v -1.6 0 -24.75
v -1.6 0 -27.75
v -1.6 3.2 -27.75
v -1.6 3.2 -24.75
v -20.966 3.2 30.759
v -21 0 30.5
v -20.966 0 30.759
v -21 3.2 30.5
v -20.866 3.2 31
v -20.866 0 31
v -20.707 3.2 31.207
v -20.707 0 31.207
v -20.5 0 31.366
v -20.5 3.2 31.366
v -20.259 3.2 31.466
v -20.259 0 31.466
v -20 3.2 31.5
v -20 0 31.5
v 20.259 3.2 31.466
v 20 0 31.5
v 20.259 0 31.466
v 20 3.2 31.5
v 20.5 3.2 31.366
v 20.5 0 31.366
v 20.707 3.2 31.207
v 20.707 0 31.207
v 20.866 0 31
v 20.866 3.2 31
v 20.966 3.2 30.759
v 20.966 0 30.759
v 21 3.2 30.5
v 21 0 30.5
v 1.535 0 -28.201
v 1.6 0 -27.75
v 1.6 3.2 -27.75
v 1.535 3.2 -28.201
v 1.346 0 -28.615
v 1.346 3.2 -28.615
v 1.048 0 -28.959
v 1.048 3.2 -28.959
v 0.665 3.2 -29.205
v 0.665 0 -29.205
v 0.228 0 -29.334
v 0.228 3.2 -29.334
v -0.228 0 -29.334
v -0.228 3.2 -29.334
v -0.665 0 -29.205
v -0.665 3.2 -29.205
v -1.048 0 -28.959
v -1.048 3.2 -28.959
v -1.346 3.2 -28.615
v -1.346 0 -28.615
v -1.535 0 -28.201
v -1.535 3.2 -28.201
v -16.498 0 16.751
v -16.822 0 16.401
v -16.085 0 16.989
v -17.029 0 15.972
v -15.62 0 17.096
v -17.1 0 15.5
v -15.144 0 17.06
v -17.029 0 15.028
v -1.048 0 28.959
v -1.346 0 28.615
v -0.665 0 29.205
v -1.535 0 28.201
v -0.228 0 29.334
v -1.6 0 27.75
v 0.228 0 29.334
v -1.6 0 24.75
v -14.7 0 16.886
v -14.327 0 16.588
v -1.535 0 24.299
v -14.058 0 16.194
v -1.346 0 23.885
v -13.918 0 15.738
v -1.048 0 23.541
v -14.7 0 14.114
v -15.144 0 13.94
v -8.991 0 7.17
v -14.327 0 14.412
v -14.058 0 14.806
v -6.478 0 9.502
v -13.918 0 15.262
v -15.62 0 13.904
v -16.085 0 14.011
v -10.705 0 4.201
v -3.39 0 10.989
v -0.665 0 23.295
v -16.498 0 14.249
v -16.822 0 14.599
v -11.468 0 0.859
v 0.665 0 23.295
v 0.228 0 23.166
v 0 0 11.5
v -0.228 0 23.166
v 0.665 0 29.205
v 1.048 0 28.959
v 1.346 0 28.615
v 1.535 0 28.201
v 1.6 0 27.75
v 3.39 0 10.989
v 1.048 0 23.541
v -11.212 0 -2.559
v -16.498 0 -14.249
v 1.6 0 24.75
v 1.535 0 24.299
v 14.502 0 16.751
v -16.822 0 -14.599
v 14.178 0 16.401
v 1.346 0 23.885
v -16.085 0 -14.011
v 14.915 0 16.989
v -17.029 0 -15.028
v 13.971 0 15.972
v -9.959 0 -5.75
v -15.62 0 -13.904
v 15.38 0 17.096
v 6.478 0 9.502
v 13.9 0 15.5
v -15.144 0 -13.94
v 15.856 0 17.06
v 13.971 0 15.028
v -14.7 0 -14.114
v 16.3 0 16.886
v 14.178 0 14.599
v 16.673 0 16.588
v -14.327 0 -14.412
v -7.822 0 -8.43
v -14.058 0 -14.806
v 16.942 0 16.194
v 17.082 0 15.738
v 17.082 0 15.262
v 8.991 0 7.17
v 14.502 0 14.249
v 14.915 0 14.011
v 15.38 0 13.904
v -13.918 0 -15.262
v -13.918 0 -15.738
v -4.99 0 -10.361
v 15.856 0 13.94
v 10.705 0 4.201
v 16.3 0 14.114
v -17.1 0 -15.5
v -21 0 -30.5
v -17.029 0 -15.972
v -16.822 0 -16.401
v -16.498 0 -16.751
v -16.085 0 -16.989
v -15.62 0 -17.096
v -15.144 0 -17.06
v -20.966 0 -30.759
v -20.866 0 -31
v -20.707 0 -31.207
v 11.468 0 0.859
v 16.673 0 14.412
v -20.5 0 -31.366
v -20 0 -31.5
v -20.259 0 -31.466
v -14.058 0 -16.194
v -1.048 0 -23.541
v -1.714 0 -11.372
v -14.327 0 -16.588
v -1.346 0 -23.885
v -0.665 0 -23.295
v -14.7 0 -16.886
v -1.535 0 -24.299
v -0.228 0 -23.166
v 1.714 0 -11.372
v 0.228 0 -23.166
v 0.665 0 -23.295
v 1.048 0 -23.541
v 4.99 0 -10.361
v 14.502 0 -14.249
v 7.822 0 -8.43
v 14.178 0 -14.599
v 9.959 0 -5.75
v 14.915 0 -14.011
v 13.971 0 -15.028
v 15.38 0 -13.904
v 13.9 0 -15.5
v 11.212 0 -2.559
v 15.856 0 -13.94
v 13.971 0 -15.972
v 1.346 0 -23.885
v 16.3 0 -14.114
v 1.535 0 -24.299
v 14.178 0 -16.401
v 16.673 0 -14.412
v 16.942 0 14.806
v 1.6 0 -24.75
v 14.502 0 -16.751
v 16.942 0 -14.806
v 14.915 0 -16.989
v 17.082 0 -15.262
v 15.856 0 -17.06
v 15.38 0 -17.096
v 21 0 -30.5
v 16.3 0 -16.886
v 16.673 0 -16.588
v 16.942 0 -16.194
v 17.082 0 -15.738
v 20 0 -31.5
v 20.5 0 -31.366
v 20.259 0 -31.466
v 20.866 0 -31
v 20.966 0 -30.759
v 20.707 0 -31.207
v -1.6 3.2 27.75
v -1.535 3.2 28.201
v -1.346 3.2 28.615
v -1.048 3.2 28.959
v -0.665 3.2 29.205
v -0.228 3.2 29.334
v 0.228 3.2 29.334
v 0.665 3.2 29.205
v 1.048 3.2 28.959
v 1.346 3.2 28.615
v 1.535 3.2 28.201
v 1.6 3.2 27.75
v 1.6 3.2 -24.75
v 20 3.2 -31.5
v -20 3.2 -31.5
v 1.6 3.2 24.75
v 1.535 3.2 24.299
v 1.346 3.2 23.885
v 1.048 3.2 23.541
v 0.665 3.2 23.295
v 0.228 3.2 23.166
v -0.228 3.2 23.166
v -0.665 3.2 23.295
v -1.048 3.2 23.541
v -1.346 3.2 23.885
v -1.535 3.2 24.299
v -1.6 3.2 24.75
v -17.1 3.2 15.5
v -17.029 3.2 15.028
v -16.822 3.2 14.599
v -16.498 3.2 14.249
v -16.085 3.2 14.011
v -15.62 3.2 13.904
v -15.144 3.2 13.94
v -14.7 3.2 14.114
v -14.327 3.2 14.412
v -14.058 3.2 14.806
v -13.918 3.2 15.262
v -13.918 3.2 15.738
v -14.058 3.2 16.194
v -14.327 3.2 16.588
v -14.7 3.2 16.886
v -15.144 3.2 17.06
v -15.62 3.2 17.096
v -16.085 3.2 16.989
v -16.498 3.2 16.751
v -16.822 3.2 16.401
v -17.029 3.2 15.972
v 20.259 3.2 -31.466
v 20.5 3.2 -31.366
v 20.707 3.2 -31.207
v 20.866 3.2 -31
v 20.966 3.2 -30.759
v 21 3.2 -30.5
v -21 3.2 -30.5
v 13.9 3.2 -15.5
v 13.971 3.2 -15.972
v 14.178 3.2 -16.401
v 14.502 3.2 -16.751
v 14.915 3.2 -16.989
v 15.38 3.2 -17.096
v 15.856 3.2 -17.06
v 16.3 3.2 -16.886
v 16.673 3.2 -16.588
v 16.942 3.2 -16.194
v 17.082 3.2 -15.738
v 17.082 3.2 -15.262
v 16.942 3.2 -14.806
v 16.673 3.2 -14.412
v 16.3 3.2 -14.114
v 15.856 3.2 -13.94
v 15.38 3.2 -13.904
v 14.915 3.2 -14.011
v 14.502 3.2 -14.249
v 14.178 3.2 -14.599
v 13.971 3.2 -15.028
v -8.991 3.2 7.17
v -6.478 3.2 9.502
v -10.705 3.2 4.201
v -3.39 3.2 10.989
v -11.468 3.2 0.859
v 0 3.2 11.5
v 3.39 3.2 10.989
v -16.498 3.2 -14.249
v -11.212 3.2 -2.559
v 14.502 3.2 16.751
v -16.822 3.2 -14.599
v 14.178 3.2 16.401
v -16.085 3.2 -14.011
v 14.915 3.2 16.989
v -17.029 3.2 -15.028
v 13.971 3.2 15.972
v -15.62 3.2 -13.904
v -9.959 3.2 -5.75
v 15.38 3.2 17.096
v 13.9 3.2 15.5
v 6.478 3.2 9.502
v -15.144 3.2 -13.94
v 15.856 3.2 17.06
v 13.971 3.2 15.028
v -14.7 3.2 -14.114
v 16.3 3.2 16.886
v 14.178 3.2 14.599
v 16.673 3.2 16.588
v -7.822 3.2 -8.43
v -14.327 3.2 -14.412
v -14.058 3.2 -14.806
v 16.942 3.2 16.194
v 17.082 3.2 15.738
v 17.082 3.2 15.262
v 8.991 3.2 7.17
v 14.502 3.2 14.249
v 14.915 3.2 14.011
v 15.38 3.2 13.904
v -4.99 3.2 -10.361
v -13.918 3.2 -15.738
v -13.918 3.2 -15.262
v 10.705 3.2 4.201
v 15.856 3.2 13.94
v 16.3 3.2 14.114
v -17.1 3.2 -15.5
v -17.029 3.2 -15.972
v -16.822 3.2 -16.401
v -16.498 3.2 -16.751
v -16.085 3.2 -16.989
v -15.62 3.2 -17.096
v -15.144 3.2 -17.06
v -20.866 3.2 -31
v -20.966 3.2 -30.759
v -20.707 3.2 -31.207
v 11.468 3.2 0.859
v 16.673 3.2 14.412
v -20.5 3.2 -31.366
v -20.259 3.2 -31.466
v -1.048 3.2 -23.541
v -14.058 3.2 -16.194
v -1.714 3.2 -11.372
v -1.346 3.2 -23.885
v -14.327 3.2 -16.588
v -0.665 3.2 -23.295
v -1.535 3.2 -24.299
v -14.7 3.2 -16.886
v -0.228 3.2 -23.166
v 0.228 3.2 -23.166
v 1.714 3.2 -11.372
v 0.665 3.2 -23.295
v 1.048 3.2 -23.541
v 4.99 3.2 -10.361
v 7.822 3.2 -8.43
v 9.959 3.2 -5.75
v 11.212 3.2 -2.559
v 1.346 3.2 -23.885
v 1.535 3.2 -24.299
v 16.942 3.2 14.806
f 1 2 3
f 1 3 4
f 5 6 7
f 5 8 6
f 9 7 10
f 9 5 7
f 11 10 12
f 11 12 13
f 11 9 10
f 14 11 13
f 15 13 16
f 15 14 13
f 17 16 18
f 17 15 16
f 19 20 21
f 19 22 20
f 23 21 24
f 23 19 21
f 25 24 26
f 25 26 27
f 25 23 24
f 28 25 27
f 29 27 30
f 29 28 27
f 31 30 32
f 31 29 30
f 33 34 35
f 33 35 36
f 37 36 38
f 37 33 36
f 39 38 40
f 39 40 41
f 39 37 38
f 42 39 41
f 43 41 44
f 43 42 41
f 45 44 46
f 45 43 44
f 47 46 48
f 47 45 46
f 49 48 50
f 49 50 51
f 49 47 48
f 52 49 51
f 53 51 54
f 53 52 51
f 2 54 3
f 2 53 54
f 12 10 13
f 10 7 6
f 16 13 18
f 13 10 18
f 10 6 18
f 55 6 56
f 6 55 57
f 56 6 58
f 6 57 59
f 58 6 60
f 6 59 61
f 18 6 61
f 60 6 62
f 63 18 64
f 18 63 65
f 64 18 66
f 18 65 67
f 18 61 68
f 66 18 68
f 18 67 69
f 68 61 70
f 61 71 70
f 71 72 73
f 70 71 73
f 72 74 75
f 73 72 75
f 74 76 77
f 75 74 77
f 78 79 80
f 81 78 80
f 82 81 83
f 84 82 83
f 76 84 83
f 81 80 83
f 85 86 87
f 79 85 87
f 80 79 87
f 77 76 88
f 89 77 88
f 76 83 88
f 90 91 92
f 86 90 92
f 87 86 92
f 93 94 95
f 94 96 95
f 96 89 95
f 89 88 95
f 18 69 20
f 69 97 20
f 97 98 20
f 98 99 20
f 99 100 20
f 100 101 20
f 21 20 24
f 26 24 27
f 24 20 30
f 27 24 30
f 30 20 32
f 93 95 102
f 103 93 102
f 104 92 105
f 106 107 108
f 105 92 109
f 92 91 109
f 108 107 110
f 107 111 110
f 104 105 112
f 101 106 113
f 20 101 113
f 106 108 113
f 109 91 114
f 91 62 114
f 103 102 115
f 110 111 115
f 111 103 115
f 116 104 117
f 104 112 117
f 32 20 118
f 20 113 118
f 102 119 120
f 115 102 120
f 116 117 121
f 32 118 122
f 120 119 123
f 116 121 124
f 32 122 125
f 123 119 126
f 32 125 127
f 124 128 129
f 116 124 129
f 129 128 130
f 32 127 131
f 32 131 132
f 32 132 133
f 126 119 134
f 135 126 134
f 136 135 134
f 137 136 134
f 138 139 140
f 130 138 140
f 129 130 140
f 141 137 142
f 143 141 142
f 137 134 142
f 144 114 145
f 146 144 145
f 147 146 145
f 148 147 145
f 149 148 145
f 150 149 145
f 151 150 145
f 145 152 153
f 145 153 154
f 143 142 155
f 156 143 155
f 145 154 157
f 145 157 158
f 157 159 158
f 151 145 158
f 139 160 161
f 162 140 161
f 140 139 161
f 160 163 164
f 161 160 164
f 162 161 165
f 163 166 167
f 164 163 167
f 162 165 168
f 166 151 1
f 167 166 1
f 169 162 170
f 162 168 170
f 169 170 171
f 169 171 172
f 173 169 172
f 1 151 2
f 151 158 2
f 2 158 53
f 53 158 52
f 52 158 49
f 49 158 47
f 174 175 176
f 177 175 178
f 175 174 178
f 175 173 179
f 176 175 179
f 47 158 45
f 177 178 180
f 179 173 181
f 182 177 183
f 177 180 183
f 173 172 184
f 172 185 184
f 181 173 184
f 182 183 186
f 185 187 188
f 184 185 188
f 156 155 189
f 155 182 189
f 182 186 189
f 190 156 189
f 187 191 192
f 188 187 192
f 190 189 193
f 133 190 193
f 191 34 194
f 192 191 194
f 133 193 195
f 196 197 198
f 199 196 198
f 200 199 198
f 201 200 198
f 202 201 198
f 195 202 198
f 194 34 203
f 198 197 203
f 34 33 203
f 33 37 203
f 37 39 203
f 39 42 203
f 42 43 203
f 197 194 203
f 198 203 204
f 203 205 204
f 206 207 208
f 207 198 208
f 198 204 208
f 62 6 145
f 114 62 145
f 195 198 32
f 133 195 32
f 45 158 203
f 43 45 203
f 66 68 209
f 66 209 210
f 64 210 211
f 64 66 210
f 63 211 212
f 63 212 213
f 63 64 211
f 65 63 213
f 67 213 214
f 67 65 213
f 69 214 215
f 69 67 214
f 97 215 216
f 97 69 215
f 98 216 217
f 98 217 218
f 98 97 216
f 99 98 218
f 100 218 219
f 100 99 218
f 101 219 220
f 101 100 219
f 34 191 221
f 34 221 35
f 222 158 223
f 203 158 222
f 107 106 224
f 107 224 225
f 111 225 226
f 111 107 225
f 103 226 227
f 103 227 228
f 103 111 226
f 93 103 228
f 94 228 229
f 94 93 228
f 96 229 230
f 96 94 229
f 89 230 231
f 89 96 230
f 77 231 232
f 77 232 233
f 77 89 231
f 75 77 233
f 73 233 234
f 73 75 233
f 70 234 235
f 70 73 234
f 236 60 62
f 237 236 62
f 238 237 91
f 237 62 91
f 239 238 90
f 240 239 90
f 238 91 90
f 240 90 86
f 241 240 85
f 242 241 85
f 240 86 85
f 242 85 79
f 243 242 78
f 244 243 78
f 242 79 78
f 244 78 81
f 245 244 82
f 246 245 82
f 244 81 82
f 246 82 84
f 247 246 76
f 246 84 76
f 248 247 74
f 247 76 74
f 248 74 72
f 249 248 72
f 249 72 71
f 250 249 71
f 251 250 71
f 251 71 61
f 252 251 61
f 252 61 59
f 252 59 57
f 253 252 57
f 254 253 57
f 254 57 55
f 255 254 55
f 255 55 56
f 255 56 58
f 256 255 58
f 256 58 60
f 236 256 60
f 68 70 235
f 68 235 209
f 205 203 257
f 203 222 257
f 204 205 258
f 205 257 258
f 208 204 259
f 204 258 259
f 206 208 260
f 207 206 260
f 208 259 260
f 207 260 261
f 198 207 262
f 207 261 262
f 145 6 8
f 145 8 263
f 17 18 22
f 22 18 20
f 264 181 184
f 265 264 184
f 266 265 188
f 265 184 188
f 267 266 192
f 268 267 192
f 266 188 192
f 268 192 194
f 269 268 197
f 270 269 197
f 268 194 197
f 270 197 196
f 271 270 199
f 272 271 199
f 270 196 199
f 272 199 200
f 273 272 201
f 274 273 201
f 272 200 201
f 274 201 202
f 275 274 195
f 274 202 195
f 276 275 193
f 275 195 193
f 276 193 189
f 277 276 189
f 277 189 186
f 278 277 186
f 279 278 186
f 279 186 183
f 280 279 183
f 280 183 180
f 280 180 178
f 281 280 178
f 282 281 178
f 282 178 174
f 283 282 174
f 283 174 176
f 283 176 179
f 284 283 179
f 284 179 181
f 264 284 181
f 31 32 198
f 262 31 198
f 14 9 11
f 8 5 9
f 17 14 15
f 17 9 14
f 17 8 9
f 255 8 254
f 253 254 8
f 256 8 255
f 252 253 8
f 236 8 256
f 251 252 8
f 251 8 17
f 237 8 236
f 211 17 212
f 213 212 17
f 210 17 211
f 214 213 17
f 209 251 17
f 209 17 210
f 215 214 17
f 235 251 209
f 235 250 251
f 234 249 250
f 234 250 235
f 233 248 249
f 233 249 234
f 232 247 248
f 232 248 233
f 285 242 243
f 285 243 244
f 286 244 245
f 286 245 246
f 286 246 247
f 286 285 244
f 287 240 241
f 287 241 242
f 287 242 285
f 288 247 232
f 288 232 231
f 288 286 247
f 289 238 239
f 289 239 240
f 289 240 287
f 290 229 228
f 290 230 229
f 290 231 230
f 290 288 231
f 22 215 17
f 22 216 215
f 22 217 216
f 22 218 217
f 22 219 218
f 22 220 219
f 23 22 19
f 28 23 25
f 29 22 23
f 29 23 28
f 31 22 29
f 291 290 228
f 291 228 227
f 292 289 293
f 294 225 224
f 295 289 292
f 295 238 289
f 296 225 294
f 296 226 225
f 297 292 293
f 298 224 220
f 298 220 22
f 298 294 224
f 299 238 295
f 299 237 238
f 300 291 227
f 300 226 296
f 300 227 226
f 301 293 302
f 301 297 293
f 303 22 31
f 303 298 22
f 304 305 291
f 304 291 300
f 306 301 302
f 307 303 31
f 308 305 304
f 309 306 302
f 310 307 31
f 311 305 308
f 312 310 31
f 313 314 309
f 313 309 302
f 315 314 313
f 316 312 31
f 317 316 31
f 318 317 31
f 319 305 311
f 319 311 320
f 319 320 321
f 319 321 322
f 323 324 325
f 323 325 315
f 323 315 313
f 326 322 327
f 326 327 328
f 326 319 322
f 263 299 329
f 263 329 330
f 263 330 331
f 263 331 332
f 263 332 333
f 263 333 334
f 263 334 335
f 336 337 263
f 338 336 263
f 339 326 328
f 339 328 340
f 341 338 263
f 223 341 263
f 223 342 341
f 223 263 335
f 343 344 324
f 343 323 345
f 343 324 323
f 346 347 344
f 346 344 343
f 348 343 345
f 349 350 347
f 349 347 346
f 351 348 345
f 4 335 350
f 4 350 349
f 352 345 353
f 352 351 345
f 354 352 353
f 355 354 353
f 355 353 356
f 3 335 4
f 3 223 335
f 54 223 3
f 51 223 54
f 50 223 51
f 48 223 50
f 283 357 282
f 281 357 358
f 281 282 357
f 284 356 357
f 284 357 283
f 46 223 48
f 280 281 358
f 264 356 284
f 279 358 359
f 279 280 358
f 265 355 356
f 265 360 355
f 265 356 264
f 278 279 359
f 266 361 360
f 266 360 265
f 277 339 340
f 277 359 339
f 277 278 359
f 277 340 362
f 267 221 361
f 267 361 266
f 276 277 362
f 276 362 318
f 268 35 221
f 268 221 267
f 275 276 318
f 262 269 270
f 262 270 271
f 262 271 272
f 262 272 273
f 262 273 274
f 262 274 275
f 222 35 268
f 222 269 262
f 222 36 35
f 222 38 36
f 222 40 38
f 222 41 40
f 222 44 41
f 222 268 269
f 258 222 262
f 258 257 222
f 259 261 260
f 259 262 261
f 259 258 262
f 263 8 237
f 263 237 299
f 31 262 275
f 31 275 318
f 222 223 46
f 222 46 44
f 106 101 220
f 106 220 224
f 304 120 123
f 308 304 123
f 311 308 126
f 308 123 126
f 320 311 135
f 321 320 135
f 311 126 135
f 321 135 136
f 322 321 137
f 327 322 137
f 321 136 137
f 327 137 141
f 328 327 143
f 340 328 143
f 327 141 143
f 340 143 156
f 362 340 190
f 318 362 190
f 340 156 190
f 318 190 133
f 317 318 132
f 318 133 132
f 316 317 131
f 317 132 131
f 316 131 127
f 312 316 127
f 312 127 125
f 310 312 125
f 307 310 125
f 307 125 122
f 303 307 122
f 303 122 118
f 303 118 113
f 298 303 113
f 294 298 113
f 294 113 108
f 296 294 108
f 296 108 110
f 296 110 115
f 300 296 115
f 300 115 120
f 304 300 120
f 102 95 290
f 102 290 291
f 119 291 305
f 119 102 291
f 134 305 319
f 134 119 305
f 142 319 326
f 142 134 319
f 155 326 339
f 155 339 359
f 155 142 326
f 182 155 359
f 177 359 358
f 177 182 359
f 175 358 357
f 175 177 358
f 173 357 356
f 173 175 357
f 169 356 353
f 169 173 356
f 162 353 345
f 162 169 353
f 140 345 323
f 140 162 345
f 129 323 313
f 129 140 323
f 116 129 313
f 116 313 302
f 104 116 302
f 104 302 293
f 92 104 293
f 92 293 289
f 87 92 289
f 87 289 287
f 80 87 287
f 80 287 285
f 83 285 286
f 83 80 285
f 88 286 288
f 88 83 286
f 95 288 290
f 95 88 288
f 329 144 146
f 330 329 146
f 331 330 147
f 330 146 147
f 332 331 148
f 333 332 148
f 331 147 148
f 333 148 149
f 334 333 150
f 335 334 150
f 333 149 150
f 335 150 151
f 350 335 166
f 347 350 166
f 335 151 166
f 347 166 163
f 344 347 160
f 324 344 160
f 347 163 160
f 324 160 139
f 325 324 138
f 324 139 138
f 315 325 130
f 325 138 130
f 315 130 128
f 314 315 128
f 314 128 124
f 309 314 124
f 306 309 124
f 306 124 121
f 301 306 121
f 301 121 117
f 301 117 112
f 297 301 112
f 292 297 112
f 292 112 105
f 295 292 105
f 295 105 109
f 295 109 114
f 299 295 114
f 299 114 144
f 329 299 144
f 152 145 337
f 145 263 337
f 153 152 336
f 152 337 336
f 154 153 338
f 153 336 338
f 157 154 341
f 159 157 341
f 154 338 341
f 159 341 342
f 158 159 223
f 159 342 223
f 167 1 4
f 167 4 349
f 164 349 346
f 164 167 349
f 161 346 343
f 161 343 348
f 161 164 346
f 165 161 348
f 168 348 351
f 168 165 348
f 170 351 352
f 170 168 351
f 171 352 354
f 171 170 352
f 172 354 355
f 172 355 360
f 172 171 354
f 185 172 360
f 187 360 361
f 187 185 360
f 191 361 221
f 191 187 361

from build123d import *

# Parameters (mm, degrees)
SKETCH1_W                = 42
SKETCH1_H                = 63
SKETCH1_R                = 11.5
BOSS_EXTRUDE1_DEPTH      = 3.2
M3_CLEARANCE_HOLE1_D     = 3.2
M3_CLEARANCE_SLOT1_DEPTH = 3.2
FILLET1_R                = 1


# Read off the part's stored shape, not the designer's step: M3 Clearance Slot1
with BuildPart() as part:
    # Sketch1 → Boss-Extrude1 (new body)
    with BuildSketch(Plane(origin=(0, 0, 0), x_dir=(1, 0, 0), z_dir=(0, 1, 0))):
        Rectangle(SKETCH1_W, SKETCH1_H)
        with Locations(Location((0, 0, 0), (0, 0, 270))):
            Circle(SKETCH1_R, mode=Mode.SUBTRACT)
    extrude(amount=BOSS_EXTRUDE1_DEPTH)

    # M3 Clearance Hole1 (through all)
    with Locations(Plane(origin=(0, 3.2, 0), x_dir=(1, 0, 0), z_dir=(0, 1, 0))):
        with Locations((-15.5, 15.5), (15.5, 15.5), (15.5, -15.5), (-15.5, -15.5)):
            Hole(M3_CLEARANCE_HOLE1_D / 2)

    # M3 Clearance Slot1 outline → M3 Clearance Slot1 (cut)
    with BuildSketch(Plane(origin=(0, 0, 0), x_dir=(1, 0, 0), z_dir=(0, 1, 0))):
        with BuildLine():
            Line((1.6, -27.75), (1.6, -24.75))
            ThreePointArc((1.6, -24.75), (0, -23.15), (-1.6, -24.75))
            Line((-1.6, -24.75), (-1.6, -27.75))
            ThreePointArc((-1.6, -27.75), (0, -29.35), (1.6, -27.75))
        make_face()
        with BuildLine():
            ThreePointArc((1.6, 27.75), (0, 29.35), (-1.6, 27.75))
            Line((-1.6, 27.75), (-1.6, 24.75))
            ThreePointArc((-1.6, 24.75), (0, 23.15), (1.6, 24.75))
            Line((1.6, 24.75), (1.6, 27.75))
        make_face()
    extrude(amount=M3_CLEARANCE_SLOT1_DEPTH, mode=Mode.SUBTRACT)

    # Fillet1
    fillet1_edges = [part.edges().sort_by_distance(p)[0] for p in [
        (-21, 1.6, -31.5),
        (21, 1.6, -31.5),
        (21, 1.6, 31.5),
        (-21, 1.6, 31.5),
    ]]
    fillet(fillet1_edges, radius=FILLET1_R)


solid = part.part
